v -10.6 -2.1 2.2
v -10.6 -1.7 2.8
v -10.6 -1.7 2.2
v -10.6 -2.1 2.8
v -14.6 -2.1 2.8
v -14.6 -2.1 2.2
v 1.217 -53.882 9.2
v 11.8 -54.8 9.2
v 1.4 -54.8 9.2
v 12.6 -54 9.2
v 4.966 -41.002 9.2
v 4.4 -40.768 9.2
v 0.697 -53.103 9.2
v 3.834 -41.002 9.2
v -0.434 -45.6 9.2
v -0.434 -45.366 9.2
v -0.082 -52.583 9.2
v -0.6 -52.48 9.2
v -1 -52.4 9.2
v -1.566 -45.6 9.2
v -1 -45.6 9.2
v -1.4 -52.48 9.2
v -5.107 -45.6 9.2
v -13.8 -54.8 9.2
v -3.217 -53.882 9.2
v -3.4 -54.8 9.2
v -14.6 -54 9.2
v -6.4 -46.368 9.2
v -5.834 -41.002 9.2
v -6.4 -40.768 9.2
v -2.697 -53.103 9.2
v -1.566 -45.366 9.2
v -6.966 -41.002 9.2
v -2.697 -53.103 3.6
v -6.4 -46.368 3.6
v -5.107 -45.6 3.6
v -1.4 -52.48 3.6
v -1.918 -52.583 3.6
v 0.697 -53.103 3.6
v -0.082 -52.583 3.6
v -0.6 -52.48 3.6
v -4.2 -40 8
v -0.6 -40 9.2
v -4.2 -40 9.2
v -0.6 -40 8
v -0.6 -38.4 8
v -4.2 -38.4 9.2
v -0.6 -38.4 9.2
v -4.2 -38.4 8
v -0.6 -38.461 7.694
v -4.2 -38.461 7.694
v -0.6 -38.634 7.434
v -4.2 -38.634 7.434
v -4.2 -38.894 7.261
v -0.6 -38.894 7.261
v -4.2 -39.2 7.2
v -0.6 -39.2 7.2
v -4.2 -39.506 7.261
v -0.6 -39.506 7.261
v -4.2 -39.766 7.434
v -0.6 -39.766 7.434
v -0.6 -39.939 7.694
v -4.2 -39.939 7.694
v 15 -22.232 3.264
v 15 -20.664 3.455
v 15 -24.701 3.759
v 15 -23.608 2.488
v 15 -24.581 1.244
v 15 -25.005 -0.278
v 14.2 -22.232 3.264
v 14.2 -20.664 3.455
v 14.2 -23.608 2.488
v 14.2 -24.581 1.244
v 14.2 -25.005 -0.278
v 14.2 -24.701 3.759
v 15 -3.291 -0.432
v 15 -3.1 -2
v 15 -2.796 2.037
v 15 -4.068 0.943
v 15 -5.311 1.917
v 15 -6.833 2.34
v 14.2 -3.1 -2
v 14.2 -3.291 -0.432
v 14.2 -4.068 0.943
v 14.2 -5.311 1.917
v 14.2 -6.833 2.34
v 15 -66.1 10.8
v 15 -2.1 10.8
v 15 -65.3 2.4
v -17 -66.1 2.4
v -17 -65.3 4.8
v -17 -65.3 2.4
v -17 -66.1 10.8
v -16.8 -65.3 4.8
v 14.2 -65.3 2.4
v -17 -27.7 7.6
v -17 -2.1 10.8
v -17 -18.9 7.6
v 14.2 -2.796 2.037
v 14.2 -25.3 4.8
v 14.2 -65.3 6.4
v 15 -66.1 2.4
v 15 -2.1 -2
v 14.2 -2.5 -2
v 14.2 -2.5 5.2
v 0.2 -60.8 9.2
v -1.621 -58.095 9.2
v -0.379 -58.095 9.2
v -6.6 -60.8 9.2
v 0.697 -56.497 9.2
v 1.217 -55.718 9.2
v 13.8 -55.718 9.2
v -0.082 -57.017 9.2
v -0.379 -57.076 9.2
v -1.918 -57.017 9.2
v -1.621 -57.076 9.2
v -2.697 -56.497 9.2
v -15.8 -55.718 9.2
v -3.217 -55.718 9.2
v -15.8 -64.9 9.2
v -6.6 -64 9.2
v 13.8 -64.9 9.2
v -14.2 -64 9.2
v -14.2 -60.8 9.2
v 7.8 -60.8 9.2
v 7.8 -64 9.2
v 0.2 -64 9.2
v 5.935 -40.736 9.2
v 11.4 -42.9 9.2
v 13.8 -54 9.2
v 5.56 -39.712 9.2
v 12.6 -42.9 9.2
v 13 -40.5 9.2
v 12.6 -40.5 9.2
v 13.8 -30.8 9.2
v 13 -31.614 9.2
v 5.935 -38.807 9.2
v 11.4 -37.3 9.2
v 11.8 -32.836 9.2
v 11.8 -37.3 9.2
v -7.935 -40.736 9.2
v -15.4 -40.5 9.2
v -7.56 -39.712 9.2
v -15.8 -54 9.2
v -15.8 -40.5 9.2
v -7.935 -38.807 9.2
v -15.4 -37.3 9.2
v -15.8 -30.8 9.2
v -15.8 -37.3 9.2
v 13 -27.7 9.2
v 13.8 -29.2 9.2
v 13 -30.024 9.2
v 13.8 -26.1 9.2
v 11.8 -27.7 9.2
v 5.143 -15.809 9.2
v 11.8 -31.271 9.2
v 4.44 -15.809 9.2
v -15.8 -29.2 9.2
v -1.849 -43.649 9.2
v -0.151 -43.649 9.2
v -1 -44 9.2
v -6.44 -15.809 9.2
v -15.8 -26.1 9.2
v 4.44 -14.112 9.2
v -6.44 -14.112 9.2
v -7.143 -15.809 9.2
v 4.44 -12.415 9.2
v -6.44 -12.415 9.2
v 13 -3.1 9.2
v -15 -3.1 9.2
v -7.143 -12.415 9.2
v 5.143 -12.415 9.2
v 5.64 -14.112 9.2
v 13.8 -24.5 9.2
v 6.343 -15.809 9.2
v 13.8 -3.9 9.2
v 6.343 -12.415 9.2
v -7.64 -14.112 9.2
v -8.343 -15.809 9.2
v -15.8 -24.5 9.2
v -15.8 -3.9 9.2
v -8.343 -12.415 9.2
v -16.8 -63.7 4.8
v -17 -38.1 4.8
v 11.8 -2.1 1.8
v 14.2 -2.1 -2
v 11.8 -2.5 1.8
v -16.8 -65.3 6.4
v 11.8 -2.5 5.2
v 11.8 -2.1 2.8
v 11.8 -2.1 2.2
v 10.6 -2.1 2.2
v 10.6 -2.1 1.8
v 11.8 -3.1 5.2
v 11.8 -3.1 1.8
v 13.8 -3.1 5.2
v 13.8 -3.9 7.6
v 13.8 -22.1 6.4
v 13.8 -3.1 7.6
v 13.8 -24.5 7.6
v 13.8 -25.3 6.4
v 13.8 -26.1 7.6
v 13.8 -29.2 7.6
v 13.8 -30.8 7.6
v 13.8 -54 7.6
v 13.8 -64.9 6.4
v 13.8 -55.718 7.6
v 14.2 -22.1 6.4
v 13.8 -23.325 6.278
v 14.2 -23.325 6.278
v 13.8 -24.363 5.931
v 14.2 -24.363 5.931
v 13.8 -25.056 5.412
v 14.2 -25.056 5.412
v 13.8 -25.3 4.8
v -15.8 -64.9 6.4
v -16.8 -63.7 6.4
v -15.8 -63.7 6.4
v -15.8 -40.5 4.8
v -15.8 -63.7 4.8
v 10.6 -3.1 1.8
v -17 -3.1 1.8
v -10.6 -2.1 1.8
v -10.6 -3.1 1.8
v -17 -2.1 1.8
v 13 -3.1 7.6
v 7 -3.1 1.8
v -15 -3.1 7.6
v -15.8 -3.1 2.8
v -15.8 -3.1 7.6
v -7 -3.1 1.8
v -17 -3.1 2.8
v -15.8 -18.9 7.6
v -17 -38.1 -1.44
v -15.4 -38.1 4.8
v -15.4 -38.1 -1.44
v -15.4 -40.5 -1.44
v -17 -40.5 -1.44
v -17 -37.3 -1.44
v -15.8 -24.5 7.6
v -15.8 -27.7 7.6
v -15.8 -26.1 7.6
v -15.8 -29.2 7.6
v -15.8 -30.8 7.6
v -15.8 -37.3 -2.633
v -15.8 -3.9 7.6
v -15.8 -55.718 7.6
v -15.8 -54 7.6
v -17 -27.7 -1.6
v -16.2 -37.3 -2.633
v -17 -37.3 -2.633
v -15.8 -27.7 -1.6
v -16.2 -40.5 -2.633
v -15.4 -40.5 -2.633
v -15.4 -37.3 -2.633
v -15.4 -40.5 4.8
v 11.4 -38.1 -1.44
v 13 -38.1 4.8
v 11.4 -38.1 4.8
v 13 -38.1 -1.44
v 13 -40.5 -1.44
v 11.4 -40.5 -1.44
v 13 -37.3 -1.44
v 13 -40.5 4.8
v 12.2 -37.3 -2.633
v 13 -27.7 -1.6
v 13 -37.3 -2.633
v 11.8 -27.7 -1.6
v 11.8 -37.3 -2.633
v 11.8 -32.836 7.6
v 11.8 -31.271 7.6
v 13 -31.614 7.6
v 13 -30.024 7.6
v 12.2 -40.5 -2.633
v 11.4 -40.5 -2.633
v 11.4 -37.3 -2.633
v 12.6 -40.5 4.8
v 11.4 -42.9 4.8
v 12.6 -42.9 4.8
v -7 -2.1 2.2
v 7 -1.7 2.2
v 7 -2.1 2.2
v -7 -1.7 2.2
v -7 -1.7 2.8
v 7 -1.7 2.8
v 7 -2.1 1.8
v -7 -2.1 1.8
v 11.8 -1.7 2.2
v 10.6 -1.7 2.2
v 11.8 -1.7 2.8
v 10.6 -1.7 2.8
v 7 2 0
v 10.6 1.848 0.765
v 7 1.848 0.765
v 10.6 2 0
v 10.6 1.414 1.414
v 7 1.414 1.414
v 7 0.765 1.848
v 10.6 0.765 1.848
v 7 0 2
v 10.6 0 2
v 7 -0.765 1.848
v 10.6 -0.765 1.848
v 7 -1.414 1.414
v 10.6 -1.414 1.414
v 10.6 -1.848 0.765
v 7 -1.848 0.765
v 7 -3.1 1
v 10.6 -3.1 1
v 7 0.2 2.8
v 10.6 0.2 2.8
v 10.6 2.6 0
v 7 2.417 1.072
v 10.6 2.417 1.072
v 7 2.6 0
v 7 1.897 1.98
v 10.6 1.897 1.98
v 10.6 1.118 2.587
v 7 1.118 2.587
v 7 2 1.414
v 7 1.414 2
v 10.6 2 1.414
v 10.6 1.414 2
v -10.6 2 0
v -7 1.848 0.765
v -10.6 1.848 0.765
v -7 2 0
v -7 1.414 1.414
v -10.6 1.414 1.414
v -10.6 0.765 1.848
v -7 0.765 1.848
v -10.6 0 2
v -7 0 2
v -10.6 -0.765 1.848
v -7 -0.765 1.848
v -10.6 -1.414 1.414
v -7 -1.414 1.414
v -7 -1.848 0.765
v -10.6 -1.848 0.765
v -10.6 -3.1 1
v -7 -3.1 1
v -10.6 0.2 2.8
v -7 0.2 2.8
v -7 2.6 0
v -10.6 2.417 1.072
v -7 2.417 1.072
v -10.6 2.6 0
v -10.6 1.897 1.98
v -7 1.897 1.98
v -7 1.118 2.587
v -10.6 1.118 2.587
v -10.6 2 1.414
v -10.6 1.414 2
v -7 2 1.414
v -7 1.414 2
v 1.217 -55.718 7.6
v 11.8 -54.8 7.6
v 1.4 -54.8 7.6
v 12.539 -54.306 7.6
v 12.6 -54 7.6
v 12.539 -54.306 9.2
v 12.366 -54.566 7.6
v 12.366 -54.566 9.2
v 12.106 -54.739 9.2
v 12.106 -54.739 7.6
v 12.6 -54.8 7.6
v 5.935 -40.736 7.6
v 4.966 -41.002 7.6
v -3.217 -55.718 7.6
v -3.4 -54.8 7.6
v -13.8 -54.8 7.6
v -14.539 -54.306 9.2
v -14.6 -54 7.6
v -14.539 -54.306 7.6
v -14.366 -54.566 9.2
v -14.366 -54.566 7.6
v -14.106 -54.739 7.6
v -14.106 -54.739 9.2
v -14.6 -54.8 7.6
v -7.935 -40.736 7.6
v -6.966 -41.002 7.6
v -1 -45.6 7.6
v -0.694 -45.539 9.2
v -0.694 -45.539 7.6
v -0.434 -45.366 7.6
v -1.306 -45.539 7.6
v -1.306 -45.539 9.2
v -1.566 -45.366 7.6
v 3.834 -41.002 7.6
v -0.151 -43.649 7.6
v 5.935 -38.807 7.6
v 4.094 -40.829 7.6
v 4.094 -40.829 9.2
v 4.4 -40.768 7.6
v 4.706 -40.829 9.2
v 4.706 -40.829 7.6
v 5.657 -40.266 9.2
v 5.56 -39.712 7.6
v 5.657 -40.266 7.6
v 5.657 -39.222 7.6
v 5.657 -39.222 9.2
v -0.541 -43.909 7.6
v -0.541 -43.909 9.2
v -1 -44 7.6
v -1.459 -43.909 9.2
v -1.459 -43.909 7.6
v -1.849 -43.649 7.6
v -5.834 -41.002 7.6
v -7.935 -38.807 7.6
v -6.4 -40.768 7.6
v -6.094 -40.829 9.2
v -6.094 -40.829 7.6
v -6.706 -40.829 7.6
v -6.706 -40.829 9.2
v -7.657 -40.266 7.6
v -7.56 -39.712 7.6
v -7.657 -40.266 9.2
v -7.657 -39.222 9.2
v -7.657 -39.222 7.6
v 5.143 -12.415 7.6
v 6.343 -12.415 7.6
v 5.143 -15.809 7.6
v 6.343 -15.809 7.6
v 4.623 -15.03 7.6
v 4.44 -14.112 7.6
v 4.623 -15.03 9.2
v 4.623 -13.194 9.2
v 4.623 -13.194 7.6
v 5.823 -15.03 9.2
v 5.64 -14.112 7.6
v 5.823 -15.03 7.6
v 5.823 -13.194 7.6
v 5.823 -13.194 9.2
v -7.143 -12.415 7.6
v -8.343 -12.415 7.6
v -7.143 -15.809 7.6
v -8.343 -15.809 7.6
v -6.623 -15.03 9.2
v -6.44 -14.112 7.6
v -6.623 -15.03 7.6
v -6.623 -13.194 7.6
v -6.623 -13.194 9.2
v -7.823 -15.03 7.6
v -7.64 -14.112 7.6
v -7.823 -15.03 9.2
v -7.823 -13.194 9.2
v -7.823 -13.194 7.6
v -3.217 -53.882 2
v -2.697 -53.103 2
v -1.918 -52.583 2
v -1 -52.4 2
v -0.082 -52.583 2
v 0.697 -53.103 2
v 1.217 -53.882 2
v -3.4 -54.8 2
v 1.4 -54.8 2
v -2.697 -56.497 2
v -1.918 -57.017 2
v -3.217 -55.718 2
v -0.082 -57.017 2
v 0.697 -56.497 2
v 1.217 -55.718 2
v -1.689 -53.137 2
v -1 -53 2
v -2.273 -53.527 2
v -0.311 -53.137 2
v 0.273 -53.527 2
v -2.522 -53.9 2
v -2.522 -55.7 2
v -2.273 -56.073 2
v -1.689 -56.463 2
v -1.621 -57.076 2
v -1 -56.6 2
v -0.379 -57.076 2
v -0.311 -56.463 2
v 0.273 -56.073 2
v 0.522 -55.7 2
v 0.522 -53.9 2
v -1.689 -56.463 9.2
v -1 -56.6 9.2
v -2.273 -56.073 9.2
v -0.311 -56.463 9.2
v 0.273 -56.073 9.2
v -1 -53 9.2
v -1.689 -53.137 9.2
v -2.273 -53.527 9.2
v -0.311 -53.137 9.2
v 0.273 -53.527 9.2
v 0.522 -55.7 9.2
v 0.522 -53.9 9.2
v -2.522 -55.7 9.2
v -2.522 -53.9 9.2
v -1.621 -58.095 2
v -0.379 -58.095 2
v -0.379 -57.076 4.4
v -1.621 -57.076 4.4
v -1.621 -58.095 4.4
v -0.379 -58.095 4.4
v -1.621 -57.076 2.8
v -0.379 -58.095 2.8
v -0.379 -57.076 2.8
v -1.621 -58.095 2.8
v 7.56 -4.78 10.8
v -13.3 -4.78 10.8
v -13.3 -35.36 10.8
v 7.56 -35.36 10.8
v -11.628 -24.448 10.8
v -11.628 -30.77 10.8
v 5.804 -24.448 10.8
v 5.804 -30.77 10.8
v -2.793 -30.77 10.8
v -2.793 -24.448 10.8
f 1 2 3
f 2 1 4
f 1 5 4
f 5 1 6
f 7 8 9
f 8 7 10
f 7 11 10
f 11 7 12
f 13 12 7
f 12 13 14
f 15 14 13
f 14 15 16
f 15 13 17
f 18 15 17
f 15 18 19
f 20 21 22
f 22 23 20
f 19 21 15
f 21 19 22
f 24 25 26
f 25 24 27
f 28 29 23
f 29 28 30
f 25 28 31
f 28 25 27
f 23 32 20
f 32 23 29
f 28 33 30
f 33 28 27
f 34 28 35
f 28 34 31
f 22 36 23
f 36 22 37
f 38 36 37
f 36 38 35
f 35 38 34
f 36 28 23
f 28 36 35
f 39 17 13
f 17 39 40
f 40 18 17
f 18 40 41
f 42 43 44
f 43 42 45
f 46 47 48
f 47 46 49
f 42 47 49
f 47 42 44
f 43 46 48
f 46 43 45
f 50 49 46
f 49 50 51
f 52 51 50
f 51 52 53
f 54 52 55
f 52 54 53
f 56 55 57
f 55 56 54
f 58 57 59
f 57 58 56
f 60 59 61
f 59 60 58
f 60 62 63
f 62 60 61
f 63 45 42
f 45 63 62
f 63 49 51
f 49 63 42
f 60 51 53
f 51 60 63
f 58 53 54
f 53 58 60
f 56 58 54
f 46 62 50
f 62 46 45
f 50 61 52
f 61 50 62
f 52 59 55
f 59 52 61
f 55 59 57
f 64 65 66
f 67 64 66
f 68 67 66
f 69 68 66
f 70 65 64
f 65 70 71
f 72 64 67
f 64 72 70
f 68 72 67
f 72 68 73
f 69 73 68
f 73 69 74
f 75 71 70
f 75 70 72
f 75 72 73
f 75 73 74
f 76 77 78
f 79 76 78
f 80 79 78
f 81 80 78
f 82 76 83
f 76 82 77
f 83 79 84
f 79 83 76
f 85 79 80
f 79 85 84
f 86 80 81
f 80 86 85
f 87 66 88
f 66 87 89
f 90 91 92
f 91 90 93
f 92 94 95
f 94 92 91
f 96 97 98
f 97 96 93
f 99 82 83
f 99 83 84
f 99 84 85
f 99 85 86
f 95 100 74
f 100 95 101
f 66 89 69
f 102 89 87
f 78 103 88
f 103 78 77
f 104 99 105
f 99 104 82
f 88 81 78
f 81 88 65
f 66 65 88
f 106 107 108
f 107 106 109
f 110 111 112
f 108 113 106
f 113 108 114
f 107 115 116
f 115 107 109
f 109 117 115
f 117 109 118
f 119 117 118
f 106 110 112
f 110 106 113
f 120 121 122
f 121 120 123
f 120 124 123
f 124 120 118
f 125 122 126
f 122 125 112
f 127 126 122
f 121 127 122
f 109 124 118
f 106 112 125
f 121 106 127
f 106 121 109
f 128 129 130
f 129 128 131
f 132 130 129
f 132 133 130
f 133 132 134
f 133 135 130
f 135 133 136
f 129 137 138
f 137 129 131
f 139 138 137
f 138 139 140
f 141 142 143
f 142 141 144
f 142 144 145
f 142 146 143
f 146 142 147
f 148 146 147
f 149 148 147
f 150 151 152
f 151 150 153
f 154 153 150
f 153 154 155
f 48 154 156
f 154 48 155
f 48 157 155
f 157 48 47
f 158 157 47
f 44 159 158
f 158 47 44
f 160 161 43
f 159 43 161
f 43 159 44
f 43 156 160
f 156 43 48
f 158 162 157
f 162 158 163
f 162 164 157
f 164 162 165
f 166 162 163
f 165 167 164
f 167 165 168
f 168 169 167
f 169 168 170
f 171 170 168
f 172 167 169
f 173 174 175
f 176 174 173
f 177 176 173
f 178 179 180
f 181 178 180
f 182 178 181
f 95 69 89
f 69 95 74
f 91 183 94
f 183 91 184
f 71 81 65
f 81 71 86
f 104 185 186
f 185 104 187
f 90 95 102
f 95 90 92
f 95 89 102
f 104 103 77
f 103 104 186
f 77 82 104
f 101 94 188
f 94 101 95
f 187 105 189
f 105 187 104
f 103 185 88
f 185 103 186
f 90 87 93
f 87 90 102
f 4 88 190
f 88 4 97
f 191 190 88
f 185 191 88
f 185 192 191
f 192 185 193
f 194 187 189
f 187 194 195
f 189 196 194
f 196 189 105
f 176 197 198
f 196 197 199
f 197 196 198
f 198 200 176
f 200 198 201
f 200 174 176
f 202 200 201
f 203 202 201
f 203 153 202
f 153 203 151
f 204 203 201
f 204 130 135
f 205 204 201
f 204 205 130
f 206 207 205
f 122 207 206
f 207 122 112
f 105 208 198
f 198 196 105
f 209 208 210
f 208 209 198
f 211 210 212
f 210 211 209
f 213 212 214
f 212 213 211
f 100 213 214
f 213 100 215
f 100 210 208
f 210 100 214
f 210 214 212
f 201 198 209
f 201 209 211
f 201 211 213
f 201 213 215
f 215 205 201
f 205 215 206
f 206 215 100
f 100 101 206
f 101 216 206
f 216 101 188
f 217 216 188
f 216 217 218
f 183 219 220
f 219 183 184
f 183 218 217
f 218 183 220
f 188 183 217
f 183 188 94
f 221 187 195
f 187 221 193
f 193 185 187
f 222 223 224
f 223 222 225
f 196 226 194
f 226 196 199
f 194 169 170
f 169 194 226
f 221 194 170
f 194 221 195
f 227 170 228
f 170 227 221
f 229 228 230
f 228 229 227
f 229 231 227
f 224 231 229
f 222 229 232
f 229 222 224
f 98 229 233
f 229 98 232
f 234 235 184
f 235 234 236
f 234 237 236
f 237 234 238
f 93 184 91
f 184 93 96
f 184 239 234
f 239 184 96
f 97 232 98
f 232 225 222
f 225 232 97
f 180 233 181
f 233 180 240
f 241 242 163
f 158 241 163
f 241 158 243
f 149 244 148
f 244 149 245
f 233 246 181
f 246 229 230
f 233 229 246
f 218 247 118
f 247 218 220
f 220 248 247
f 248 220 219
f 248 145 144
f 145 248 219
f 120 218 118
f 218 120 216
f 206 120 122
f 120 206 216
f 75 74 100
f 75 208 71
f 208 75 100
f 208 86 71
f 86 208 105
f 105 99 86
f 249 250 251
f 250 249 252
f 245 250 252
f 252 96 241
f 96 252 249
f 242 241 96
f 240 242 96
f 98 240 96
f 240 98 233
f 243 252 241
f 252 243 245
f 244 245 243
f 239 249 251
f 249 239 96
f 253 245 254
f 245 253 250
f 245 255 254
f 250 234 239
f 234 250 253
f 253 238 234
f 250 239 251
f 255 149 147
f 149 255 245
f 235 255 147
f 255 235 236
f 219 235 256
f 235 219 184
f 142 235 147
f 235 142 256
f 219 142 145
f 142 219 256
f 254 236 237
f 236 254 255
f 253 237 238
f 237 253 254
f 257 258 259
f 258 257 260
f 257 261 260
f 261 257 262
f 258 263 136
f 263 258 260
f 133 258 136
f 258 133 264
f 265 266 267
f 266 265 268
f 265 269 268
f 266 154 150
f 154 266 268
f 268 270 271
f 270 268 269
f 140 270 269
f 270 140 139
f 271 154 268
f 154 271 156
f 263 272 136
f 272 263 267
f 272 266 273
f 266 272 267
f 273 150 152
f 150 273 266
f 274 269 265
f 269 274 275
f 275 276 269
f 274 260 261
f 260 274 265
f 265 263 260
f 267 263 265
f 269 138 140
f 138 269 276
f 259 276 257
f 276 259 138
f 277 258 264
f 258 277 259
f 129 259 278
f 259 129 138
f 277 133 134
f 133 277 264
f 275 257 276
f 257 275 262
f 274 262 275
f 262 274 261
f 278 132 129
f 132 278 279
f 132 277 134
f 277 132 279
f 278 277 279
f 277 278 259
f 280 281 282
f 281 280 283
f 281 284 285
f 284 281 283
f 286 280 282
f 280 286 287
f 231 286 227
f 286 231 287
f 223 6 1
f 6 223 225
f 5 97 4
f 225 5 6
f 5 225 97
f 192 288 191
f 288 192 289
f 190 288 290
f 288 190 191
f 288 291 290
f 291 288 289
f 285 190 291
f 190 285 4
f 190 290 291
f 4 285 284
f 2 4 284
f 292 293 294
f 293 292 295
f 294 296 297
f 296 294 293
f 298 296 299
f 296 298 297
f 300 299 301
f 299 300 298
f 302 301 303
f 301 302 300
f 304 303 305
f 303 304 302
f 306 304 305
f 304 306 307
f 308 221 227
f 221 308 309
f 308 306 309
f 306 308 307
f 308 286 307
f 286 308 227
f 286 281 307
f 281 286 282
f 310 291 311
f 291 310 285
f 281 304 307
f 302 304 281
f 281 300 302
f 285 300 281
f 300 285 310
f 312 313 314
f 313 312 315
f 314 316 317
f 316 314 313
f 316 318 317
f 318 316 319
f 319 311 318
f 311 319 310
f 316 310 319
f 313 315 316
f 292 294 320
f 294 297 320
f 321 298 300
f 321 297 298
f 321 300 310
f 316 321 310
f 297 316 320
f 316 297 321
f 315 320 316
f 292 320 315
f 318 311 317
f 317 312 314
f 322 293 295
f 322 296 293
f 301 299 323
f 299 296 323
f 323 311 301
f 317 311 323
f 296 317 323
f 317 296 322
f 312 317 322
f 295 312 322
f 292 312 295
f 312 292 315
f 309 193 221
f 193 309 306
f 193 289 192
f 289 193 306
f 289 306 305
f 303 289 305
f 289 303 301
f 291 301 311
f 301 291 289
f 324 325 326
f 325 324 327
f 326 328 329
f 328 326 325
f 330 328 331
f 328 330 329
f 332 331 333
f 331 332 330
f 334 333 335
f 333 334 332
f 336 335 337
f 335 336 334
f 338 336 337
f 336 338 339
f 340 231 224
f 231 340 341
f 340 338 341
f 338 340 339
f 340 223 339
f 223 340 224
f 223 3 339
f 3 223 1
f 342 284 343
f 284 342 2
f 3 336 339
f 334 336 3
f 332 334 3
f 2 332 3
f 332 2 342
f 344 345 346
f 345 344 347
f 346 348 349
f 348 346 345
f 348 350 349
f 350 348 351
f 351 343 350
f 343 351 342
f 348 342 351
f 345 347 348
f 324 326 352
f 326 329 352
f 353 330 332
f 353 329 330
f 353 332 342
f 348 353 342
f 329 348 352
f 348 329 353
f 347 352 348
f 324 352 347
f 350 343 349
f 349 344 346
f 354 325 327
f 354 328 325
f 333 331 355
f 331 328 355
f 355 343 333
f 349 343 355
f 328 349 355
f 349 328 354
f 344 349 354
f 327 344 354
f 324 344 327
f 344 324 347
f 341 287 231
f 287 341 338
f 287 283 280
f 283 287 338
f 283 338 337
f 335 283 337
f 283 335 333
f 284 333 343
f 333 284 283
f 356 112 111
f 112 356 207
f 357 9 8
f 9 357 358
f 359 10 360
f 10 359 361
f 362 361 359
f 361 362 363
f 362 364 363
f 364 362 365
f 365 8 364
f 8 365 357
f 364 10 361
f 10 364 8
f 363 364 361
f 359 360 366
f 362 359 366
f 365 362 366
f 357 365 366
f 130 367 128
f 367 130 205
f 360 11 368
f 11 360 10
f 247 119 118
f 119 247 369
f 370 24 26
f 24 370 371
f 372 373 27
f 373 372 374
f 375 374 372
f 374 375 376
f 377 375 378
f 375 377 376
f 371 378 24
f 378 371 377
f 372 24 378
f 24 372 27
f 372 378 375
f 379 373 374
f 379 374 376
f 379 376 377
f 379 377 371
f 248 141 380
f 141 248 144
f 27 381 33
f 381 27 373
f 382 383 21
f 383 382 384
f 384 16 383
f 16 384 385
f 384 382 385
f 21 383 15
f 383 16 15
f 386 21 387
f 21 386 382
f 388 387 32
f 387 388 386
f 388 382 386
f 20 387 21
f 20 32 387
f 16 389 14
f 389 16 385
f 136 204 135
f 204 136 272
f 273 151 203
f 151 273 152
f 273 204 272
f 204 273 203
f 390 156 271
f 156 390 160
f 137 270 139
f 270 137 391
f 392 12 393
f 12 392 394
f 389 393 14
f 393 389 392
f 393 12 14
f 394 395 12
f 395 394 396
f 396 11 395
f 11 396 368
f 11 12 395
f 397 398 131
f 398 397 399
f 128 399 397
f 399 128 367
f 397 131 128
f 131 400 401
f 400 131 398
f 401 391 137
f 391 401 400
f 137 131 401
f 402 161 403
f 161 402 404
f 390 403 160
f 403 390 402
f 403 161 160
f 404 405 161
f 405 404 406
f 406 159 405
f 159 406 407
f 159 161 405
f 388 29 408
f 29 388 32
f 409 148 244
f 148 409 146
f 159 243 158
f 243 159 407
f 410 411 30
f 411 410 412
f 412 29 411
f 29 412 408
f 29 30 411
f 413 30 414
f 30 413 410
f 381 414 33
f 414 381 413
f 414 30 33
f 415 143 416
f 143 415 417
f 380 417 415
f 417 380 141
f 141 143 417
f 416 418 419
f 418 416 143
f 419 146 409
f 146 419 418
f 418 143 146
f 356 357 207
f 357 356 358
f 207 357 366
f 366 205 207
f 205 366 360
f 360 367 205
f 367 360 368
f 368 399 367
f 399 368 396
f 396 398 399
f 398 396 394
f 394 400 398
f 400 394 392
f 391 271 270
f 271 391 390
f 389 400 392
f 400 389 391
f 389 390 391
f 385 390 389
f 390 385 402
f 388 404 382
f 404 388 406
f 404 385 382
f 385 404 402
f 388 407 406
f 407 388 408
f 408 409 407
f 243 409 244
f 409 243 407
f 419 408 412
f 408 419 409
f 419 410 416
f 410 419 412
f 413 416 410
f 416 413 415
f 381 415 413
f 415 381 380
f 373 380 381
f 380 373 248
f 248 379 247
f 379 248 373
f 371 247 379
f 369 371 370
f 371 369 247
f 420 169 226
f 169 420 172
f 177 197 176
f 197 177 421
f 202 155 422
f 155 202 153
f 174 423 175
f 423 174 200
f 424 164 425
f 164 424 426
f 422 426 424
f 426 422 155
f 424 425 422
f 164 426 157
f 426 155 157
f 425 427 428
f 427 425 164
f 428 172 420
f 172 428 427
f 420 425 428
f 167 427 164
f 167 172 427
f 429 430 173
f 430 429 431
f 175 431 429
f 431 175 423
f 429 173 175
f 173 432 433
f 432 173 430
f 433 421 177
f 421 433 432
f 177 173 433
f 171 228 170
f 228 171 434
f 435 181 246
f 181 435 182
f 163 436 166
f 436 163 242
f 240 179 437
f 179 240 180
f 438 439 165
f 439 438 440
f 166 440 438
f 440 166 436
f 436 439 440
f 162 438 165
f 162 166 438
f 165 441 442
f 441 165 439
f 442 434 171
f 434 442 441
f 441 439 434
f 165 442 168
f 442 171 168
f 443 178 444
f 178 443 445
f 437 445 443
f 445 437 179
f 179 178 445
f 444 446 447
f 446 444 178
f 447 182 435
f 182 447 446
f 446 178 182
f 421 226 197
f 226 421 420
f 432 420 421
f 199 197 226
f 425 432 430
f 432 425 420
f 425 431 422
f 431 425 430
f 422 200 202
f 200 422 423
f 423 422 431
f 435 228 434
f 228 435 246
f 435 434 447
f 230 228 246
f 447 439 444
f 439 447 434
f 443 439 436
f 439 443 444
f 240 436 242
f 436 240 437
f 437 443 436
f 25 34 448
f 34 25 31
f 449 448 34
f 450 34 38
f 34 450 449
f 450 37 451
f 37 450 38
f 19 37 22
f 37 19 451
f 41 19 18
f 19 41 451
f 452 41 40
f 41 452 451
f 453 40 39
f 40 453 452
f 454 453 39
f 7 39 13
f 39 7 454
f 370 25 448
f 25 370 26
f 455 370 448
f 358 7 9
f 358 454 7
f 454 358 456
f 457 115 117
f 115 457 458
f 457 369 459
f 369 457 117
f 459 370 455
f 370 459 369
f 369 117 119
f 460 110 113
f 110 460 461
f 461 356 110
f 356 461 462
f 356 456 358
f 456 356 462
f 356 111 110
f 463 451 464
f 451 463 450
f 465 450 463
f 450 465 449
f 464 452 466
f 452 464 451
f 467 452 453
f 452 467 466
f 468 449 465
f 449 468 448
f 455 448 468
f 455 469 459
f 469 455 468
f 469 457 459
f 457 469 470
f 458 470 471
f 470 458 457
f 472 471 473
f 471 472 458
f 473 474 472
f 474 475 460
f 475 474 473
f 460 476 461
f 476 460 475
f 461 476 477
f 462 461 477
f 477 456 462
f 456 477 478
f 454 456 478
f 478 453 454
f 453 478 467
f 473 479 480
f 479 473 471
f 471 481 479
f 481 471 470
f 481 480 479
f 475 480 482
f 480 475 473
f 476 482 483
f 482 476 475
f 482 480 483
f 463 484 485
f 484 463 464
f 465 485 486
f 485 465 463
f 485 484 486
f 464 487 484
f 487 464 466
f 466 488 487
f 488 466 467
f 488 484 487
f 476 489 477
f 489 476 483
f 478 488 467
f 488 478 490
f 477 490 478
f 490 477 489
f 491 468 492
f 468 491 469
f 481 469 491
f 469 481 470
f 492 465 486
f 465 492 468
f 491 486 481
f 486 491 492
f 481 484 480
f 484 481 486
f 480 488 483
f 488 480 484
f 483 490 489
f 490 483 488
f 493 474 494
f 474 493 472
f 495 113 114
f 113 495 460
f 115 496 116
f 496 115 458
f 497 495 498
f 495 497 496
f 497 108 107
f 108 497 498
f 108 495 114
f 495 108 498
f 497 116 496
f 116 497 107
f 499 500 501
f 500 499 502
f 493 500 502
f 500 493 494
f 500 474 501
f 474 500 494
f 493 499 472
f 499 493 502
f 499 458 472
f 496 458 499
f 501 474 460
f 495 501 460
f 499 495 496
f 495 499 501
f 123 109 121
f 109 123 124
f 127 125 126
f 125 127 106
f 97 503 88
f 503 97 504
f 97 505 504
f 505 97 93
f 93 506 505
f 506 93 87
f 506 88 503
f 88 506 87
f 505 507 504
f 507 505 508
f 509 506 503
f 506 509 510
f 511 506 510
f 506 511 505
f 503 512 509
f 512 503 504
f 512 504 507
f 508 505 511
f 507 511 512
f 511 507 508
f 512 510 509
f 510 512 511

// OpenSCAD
use <../lib.scad>
use <s/4111s01.scad>
use <s/4112s01.scad>
function ldraw_lib__4111p03() = [
// 0 ~Electric Switch: Key Right with Closed Crossing Pattern
// 0 Name: 4111p03.dat
// 0 Author: Javier Orquera [kuramapika1]
// 0 !LDRAW_ORG Part UPDATE 2025-09
// 0 !LICENSE Licensed under CC BY 4.0 : see CAreadme.txt
// 
// 0 !HELP to put this part into a pressed-down state, rotate it 4.3 degrees
// 0 !HELP around the x-axis
// 
// 0 BFC CERTIFY CCW
  [0,"BFC","CERTIFY"],
  [0,"BFC","CCW"],
// 
// 0 !KEYWORDS Set 5083, Set 7866, switch, Train
// 
// 0 !HISTORY 2025-04-24 [kuramapika1] Adapted surfaces
// 0 !HISTORY 2025-09-11 [kuramapika1] Use of new subfile
// 0 !HISTORY 2025-09-29 [OrionP] Official Update 2025-09
// 
// 1 16 0 0 0 1 0 0 0 1 0 0 0 1 s\4111s01.dat
  [1,16,0,0,0,1,0,0,0,1,0,0,0,1, ldraw_lib__s__4111s01()],
// 1 16 0 0 0 -1 0 0 0 1 0 0 0 1 s\4112s01.dat
  [1,16,0,0,0,-1,0,0,0,1,0,0,0,1, ldraw_lib__s__4112s01()],
// 4 16 -42.5 -27 -5.25 -33.25 -27 -11.95 18.9 -27 -11.95 37.5 -27 -5.25
  [4,16,-42.5,-27,-5.25,-33.25,-27,-11.95,18.9,-27,-11.95,37.5,-27,-5.25],
// 4 16 -33.25 -27 -88.4 -33.25 -27 -11.95 -42.5 -27 -5.25 -42.5 -27 -165.25
  [4,16,-33.25,-27,-88.4,-33.25,-27,-11.95,-42.5,-27,-5.25,-42.5,-27,-165.25],
// 4 16 -33.25 -27 -88.4 -42.5 -27 -165.25 37.5 -27 -165.25 18.9 -27 -88.4
  [4,16,-33.25,-27,-88.4,-42.5,-27,-165.25,37.5,-27,-165.25,18.9,-27,-88.4],
// 4 16 37.5 -27 -165.25 37.5 -27 -5.25 18.9 -27 -11.95 18.9 -27 -88.4
  [4,16,37.5,-27,-165.25,37.5,-27,-5.25,18.9,-27,-11.95,18.9,-27,-88.4],
// 4 0 -33.25 -27 -88.4 -29.071 -27 -76.9261 -29.071 -27 -61.1208 -33.25 -27 -11.95
  [4,0,-33.25,-27,-88.4,-29.071,-27,-76.9261,-29.071,-27,-61.1208,-33.25,-27,-11.95],
// 4 0 14.511 -27 -76.9261 18.9 -27 -88.4 18.9 -27 -11.95 14.511 -27 -61.1208
  [4,0,14.511,-27,-76.9261,18.9,-27,-88.4,18.9,-27,-11.95,14.511,-27,-61.1208],
// 4 0 14.511 -27 -76.9261 -6.982 -27 -76.9261 -33.25 -27 -88.4 18.9 -27 -88.4
  [4,0,14.511,-27,-76.9261,-6.982,-27,-76.9261,-33.25,-27,-88.4,18.9,-27,-88.4],
// 4 0 18.9 -27 -11.95 -33.25 -27 -11.95 -6.982 -27 -61.1208 14.511 -27 -61.1208
  [4,0,18.9,-27,-11.95,-33.25,-27,-11.95,-6.982,-27,-61.1208,14.511,-27,-61.1208],
// 3 0 -6.982 -27 -61.1208 -33.25 -27 -11.95 -29.071 -27 -61.1208
  [3,0,-6.982,-27,-61.1208,-33.25,-27,-11.95,-29.071,-27,-61.1208],
// 3 0 -29.071 -27 -76.9261 -33.25 -27 -88.4 -6.982 -27 -76.9261
  [3,0,-29.071,-27,-76.9261,-33.25,-27,-88.4,-6.982,-27,-76.9261],
// 4 4 -29.071 -27 -61.1208 -29.071 -27 -76.9261 -6.982 -27 -76.9261 -6.982 -27 -61.1208
  [4,4,-29.071,-27,-61.1208,-29.071,-27,-76.9261,-6.982,-27,-76.9261,-6.982,-27,-61.1208],
// 4 15 -6.982 -27 -61.1208 -6.982 -27 -76.9261 14.511 -27 -76.9261 14.511 -27 -61.1208
  [4,15,-6.982,-27,-61.1208,-6.982,-27,-76.9261,14.511,-27,-76.9261,14.511,-27,-61.1208],
];
module ldraw_lib__4111p03(step=0, col=false, unit=2/5, alt=false, line=0.2, solid=!$preview)
    makepoly(ldraw_lib__4111p03(), step=step, col=col, unit=unit, alt=alt, line=line, solid=solid);
ldraw_lib__4111p03(line=0.2);
